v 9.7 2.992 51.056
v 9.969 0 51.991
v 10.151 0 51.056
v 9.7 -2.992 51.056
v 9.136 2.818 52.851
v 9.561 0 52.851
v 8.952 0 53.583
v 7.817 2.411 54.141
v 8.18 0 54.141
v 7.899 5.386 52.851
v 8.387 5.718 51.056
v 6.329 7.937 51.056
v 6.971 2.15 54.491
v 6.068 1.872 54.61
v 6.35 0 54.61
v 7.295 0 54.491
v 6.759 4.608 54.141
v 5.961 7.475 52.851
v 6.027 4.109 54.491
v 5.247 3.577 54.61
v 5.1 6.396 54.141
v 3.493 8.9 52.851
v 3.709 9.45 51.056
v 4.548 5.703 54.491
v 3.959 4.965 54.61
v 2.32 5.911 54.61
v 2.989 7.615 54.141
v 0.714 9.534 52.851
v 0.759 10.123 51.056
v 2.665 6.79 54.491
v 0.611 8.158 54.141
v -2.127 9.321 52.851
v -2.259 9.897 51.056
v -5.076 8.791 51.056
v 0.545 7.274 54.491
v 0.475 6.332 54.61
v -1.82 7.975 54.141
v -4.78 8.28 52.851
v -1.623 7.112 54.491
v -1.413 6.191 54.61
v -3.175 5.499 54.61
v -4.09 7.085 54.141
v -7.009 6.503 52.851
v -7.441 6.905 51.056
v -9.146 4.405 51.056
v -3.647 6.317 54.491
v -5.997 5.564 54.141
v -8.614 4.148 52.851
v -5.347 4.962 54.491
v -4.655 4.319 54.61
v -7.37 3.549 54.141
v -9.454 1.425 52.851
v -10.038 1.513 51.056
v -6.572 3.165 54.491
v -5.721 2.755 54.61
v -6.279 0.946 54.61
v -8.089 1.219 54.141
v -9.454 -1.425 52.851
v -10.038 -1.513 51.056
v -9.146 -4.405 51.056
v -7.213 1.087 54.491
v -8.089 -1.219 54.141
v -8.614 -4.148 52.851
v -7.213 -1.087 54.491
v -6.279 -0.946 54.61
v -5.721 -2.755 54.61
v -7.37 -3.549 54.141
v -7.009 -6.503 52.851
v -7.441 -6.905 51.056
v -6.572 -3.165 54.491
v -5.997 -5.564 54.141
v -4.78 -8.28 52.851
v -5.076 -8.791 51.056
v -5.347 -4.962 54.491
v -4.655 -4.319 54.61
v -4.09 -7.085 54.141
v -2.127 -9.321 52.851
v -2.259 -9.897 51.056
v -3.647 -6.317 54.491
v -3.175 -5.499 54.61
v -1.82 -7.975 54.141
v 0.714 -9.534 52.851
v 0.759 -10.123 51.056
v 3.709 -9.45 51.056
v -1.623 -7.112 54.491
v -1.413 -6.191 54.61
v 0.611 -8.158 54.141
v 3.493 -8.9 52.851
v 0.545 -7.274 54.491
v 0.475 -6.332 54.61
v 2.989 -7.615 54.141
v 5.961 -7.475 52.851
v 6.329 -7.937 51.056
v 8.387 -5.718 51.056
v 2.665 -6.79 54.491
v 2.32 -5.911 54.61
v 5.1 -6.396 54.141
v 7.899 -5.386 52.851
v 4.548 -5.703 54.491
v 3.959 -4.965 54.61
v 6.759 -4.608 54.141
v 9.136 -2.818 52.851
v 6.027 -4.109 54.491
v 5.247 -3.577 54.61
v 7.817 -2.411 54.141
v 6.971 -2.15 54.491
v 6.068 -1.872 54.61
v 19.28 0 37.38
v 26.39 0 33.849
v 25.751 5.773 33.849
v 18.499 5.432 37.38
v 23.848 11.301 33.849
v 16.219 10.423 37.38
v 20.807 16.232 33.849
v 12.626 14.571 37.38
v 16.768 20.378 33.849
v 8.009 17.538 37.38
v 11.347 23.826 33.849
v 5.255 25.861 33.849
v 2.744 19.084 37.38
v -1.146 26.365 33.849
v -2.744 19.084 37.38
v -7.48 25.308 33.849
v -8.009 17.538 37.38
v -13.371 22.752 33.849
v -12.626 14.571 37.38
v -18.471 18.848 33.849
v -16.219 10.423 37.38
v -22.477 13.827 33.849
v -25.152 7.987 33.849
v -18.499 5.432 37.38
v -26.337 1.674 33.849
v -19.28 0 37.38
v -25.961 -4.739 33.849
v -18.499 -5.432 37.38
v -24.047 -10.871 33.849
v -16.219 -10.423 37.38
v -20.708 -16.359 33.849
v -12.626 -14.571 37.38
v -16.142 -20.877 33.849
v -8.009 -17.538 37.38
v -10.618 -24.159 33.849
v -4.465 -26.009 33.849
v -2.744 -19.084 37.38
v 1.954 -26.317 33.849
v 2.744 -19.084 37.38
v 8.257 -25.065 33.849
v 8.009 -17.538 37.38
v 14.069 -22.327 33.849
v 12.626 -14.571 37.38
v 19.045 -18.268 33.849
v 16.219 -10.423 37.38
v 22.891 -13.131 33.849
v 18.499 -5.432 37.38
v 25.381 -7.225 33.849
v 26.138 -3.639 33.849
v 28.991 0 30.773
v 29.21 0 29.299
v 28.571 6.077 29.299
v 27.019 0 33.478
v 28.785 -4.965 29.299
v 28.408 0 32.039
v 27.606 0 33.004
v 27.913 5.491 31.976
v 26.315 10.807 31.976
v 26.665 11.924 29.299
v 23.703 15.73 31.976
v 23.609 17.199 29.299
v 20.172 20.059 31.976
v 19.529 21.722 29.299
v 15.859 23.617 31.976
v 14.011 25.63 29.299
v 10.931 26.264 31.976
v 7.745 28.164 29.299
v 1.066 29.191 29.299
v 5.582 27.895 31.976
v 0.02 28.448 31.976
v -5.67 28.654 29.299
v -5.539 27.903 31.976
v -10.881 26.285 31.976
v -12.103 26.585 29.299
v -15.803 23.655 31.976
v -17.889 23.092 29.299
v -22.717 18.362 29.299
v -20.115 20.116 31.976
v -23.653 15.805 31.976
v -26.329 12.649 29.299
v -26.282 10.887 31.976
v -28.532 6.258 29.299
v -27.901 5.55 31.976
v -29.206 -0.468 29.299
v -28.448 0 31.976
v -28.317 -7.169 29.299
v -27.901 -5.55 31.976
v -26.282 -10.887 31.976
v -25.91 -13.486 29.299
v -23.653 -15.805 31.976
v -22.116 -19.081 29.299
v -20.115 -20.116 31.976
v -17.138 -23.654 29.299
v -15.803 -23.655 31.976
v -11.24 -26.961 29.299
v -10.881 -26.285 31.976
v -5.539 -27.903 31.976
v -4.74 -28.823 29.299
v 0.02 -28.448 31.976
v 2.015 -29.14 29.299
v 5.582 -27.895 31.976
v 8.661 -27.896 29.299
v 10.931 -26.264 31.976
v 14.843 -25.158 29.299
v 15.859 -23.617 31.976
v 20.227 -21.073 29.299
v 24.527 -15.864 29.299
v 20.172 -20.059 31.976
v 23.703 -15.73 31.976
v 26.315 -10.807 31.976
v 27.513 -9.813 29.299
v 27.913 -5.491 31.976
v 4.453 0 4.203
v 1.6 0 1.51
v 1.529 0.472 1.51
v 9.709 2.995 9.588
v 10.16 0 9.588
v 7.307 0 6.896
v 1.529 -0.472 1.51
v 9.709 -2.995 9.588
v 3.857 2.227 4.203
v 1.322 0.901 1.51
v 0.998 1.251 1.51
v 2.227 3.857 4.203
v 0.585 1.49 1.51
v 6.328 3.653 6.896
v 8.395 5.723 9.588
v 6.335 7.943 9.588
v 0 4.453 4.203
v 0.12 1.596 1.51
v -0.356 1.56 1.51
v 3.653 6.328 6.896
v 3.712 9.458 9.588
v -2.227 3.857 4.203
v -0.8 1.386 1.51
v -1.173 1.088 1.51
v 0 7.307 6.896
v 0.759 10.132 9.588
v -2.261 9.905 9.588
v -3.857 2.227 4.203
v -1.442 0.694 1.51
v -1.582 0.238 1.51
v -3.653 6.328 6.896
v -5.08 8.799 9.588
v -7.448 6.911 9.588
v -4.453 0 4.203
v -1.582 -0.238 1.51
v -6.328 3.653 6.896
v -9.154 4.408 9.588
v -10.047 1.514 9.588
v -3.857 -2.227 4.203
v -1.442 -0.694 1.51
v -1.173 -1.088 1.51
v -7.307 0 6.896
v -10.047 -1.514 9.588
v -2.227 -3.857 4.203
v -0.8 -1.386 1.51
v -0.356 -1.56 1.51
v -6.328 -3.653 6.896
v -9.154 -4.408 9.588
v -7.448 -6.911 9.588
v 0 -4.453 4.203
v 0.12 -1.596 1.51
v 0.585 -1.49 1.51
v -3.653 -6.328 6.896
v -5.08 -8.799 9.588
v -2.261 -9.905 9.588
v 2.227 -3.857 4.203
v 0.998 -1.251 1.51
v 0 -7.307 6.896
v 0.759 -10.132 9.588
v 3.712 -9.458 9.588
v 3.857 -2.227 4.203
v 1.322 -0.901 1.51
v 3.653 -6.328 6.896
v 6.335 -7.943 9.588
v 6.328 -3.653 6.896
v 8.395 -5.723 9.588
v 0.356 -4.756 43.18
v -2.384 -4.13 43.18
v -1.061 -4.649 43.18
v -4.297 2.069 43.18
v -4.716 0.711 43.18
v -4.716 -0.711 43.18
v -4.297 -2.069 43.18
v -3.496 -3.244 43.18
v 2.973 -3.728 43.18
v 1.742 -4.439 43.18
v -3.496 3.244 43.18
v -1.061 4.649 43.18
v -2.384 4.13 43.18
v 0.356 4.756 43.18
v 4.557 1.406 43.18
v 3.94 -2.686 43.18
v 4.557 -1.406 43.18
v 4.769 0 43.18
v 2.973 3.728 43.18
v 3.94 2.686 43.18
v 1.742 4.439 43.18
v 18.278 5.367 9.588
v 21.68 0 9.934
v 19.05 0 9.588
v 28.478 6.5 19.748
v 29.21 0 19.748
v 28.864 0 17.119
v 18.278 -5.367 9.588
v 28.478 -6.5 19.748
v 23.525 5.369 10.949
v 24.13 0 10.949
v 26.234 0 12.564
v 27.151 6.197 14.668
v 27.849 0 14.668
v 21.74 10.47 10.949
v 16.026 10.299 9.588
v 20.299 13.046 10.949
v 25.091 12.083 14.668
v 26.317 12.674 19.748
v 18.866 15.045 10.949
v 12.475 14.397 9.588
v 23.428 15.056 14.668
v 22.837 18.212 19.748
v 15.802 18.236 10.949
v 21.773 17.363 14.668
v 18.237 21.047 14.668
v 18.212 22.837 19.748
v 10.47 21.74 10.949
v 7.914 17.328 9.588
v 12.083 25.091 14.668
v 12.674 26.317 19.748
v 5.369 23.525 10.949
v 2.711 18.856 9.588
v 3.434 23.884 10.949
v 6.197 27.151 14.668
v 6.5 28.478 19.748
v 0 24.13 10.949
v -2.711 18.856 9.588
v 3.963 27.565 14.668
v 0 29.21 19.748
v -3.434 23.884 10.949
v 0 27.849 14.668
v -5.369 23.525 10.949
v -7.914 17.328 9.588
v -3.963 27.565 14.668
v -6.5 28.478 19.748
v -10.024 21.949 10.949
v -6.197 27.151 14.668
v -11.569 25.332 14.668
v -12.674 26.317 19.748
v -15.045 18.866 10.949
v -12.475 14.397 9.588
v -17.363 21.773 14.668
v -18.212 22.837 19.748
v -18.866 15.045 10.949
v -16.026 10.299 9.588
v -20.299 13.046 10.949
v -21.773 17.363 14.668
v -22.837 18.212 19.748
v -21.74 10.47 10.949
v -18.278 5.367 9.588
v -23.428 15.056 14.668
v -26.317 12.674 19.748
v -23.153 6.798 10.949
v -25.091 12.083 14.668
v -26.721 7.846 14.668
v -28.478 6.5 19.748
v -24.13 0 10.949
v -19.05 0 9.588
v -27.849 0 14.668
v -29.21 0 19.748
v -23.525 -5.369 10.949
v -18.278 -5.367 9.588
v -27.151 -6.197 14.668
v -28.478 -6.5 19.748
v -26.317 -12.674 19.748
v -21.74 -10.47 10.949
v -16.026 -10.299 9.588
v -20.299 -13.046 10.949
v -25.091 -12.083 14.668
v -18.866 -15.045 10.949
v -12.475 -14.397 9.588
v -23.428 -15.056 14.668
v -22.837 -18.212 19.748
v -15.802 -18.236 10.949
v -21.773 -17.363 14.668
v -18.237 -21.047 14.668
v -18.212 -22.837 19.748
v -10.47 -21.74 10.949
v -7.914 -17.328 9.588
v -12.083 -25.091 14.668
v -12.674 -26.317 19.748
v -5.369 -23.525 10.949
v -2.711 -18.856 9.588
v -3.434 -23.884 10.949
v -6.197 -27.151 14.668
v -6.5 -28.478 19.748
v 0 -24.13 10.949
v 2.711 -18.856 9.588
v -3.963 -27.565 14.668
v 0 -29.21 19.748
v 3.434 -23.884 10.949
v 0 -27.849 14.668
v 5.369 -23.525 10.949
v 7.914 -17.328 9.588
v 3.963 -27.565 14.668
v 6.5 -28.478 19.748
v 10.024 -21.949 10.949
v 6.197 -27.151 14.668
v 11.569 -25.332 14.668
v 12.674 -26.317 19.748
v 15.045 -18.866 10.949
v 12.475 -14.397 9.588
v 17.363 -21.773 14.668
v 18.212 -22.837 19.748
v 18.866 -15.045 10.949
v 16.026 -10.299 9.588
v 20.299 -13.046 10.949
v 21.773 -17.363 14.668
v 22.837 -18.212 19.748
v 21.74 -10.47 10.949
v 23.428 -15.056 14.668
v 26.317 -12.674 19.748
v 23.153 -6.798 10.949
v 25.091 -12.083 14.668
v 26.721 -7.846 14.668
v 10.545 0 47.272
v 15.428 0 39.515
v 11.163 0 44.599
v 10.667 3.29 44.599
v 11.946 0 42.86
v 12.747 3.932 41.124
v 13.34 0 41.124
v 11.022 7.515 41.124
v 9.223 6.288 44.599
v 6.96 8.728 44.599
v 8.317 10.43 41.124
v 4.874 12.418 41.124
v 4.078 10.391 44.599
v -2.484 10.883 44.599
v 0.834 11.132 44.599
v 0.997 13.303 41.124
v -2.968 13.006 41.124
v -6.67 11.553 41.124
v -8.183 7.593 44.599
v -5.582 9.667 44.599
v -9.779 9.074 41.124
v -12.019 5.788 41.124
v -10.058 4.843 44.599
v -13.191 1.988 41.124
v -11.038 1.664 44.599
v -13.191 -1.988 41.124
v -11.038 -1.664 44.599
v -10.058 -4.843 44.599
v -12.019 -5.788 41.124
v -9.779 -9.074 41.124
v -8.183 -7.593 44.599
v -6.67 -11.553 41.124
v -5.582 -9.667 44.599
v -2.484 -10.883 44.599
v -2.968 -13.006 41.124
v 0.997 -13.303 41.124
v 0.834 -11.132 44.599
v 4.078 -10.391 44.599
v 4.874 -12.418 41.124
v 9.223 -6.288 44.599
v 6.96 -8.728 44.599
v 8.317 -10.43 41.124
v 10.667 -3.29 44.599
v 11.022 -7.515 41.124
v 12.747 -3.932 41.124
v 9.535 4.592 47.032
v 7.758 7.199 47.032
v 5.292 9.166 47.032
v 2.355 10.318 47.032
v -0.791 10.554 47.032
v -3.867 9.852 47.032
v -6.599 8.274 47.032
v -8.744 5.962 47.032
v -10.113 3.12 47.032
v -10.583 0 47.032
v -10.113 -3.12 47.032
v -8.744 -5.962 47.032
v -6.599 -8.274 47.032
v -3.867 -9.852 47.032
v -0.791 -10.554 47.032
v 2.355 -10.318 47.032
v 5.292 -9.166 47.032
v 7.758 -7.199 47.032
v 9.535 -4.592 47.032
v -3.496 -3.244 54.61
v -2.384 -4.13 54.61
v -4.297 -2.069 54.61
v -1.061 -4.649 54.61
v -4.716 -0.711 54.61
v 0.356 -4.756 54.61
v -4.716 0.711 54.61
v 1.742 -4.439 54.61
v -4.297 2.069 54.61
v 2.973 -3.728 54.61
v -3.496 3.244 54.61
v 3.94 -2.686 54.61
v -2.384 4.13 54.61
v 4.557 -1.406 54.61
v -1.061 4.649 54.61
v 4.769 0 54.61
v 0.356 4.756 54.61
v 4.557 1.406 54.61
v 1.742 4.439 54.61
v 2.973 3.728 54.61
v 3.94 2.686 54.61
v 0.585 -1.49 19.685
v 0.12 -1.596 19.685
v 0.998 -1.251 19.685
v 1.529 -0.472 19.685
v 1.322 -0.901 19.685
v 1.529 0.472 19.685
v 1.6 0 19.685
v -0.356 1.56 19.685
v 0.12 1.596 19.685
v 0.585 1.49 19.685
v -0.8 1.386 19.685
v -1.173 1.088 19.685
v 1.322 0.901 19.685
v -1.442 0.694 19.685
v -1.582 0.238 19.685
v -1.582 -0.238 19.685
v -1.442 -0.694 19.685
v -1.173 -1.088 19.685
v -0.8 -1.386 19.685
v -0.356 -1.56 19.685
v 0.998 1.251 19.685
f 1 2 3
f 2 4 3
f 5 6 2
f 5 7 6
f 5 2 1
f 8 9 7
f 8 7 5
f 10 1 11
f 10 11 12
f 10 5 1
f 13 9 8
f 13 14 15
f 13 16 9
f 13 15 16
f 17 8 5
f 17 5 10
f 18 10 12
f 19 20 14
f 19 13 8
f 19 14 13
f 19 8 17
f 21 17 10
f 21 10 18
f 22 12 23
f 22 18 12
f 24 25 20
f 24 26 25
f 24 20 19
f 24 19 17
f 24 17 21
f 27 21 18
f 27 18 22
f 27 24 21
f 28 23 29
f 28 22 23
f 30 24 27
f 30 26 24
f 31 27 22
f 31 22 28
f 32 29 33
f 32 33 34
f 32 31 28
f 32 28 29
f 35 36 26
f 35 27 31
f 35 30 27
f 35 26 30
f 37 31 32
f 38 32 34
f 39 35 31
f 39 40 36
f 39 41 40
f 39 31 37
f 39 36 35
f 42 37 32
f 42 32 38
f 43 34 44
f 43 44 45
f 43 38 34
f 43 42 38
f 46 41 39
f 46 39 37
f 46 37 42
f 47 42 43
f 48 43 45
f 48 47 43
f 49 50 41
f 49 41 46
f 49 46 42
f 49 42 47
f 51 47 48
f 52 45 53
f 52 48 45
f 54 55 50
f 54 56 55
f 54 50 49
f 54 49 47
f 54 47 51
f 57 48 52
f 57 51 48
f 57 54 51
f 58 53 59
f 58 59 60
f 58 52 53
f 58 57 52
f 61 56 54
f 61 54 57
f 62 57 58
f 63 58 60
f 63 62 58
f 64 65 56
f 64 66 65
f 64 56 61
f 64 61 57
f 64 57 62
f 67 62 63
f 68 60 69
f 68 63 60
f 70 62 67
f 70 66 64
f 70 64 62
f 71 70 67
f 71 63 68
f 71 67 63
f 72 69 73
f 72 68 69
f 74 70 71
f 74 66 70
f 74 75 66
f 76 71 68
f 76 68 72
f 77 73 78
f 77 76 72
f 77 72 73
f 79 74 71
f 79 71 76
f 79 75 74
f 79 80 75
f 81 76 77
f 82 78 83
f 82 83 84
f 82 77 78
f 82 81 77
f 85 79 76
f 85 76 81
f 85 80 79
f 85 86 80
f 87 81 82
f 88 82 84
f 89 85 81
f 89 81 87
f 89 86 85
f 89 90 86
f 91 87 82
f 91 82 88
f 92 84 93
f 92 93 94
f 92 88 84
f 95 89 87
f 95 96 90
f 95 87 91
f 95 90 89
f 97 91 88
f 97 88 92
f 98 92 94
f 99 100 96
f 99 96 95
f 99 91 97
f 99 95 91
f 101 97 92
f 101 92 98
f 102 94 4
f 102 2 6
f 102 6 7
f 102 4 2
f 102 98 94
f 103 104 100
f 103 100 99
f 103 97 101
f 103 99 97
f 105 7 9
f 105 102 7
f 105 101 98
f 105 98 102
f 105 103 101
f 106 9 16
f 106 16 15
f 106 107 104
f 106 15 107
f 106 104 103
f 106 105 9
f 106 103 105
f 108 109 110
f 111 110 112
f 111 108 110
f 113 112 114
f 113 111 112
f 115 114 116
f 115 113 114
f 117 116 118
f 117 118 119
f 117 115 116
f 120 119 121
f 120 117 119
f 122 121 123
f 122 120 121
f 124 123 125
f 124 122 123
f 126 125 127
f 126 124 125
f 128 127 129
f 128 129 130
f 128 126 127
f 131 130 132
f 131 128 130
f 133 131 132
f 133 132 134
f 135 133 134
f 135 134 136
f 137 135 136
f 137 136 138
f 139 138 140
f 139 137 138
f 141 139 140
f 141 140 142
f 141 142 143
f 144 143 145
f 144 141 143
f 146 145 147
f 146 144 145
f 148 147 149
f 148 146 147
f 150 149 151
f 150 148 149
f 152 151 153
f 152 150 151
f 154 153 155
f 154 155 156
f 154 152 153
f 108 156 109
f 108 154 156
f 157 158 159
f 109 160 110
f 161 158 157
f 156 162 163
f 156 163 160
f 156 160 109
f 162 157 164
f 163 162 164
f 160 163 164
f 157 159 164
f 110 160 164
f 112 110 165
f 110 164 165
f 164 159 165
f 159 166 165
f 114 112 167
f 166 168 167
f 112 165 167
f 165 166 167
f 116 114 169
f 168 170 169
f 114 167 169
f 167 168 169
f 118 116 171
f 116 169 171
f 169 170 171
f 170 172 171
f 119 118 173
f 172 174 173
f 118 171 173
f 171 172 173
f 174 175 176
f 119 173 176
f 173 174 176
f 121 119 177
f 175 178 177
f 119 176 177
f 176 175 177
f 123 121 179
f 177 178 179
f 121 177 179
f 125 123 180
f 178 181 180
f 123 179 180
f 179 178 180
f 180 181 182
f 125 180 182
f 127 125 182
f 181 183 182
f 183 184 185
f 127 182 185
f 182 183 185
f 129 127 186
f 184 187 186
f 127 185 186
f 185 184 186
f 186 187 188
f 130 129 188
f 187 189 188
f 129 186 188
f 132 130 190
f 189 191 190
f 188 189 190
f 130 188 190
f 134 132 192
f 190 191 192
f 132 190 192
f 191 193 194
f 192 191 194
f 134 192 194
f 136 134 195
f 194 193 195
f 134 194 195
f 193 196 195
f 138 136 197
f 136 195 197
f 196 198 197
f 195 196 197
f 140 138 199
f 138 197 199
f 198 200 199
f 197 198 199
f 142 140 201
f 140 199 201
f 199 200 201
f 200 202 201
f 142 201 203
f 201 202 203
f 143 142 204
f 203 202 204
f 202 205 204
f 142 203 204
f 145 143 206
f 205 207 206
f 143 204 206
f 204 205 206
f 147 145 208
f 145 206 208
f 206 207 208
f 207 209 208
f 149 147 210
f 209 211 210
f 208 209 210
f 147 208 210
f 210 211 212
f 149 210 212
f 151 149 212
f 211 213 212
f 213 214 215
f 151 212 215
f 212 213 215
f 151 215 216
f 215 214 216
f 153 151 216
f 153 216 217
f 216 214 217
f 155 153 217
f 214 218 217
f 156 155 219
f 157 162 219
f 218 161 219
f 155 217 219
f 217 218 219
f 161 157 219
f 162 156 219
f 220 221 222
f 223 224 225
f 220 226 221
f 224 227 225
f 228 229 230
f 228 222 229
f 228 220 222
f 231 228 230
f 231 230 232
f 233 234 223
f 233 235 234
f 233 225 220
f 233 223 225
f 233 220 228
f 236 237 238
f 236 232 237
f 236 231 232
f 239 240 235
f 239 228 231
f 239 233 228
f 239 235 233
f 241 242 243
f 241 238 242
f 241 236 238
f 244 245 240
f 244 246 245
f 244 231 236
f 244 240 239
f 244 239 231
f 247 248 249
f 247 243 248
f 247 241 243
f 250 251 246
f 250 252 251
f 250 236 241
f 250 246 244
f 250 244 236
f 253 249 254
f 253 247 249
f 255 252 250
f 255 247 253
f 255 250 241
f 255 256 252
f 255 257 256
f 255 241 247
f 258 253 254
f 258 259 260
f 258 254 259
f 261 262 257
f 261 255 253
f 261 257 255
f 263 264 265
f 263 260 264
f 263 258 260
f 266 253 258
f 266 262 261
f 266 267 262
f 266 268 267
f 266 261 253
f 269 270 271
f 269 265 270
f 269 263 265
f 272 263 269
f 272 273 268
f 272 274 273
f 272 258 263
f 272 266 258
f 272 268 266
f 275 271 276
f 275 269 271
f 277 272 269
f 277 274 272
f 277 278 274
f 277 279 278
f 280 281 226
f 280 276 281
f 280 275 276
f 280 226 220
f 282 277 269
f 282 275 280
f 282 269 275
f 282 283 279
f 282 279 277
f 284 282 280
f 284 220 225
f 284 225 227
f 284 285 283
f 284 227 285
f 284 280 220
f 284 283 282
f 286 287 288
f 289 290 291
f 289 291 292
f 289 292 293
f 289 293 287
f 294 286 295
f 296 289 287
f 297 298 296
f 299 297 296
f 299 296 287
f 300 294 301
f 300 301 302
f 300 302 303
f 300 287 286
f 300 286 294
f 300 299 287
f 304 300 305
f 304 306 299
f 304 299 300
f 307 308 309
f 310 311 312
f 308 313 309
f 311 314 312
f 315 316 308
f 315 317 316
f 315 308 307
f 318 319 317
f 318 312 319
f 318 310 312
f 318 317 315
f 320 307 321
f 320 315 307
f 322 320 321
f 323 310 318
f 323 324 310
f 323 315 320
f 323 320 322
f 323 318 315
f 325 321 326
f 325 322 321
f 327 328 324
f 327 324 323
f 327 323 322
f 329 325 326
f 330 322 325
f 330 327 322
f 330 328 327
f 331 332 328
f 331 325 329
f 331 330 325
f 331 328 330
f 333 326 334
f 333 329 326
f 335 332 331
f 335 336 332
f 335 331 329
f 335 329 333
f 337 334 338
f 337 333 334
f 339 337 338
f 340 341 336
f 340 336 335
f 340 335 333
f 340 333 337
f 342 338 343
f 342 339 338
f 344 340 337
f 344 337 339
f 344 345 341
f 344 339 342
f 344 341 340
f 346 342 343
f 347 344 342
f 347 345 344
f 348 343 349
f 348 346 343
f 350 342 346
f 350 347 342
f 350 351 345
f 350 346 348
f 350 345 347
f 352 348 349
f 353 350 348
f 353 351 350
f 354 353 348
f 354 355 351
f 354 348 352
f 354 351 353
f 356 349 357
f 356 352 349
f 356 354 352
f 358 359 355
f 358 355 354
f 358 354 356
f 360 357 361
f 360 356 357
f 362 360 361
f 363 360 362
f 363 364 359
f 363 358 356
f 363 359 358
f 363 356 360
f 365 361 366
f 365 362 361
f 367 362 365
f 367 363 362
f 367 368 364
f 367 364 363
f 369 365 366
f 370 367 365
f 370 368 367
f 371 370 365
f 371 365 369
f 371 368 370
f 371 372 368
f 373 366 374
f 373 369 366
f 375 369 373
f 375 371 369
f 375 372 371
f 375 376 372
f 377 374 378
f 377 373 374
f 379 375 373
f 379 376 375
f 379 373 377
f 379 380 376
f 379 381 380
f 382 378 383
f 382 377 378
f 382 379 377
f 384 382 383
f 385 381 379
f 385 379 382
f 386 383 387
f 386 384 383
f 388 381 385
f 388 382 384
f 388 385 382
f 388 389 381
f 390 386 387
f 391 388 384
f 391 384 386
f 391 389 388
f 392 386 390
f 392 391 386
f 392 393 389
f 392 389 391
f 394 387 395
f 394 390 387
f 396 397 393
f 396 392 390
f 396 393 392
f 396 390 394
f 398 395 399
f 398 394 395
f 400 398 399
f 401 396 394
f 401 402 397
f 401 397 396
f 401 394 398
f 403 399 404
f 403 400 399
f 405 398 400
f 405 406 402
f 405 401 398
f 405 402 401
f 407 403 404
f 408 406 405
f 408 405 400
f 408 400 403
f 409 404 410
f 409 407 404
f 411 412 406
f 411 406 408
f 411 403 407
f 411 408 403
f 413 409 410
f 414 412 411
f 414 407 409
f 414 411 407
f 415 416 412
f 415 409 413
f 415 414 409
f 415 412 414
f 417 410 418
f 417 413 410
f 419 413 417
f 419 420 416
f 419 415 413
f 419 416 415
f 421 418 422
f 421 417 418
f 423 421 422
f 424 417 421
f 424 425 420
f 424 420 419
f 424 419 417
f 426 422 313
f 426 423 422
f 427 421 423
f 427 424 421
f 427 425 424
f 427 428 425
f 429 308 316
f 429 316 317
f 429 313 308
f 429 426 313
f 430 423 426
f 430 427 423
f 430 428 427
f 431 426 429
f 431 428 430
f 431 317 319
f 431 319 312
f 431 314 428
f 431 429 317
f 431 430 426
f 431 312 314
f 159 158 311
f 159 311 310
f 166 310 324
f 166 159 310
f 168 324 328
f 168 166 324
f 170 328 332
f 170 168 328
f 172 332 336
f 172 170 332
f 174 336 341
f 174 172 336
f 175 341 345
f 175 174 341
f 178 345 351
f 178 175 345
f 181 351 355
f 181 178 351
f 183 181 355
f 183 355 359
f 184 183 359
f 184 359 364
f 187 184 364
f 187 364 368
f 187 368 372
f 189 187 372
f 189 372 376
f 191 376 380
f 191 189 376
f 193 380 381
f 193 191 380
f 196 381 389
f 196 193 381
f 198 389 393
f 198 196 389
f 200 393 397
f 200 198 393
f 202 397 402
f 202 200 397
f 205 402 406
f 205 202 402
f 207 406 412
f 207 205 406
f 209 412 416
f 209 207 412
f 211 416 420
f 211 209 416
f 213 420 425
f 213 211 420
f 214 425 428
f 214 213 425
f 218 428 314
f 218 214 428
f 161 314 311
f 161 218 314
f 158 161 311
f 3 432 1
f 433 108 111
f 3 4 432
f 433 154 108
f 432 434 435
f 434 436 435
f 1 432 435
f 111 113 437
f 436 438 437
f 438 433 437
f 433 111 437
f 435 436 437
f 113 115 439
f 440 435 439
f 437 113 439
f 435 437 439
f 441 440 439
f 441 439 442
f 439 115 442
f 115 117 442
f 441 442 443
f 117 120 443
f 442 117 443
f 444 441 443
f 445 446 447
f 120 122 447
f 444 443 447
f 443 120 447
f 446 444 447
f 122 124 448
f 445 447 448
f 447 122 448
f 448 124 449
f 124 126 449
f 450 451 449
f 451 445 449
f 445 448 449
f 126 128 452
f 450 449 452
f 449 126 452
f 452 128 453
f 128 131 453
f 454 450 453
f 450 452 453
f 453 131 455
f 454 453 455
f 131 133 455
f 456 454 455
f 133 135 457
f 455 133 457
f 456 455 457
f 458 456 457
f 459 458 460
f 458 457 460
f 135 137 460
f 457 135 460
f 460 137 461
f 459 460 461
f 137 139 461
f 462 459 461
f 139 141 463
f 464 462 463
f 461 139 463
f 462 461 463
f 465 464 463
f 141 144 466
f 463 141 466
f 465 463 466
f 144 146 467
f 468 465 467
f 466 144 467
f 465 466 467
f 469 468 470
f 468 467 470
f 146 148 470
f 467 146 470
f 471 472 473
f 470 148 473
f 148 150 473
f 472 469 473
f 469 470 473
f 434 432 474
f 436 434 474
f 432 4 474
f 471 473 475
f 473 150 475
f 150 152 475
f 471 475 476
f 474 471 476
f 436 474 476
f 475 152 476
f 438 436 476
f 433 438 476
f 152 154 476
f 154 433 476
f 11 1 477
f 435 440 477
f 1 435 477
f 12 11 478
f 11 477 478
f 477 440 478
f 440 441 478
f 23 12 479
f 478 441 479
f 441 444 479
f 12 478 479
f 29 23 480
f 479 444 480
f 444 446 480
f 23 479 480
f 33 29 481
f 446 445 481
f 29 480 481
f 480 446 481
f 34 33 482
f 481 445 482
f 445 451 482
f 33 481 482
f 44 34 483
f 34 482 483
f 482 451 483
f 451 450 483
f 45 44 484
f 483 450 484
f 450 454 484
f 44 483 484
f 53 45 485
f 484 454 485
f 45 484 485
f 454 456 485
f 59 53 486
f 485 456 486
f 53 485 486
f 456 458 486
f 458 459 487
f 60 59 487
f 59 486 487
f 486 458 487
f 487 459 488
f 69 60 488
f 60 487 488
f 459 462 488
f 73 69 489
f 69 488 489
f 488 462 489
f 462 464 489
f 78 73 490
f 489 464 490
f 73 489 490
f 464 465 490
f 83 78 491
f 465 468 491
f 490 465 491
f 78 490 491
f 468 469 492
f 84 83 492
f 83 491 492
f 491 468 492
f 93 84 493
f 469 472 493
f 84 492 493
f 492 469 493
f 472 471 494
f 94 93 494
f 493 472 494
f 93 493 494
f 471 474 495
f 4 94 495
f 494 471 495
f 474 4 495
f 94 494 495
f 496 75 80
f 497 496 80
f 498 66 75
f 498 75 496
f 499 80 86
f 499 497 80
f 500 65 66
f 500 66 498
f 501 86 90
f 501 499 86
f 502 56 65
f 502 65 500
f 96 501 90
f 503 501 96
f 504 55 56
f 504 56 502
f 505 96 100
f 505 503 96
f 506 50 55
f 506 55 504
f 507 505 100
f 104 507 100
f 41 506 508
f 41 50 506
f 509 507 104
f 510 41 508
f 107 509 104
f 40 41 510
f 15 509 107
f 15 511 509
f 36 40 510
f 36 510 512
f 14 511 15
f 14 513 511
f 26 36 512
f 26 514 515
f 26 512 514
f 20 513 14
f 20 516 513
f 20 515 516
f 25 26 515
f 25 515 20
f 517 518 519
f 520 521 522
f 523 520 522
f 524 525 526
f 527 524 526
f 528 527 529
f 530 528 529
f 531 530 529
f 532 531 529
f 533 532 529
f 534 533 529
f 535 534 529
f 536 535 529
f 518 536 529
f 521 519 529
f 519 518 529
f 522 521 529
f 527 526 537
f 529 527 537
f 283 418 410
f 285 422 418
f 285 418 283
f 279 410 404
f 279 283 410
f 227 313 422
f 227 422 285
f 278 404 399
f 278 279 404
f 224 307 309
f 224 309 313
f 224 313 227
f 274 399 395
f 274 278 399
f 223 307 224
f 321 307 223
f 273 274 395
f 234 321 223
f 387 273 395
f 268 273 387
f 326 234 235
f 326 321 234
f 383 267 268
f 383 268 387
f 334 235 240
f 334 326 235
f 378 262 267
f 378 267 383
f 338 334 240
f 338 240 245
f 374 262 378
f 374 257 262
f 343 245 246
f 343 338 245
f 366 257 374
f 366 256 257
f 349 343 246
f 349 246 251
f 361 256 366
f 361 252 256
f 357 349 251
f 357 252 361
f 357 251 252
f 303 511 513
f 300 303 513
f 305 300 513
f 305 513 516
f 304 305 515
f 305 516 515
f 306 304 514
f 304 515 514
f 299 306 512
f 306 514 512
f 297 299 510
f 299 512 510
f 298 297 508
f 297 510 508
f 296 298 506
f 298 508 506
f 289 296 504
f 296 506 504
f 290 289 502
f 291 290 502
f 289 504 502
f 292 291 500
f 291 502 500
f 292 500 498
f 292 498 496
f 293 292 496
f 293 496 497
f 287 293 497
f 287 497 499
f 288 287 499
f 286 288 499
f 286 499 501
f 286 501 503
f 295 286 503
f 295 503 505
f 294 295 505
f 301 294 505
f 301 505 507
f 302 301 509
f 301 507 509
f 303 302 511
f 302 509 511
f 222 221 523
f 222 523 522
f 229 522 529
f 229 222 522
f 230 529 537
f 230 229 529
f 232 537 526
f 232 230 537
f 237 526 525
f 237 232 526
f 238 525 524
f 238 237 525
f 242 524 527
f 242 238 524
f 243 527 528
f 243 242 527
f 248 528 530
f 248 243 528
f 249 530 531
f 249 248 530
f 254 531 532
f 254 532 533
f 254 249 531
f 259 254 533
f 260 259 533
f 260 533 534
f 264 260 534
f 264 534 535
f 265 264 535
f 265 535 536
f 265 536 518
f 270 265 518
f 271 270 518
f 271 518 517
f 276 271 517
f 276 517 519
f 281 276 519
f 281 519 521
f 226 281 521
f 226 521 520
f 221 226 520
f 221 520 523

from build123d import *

# Parameters (mm, degrees)
F2_R     = 10.16
F3_R     = 5.08
F4_R     = 4.76885
F5_DEPTH = 11.43
F6_R     = 1.6002
F7_DEPTH = 19.685
F8_R     = 3.81


# Not quite as in the source:
# - a fillet or chamfer that OpenCascade refuses, or shapes differently, is made with other operations: its cross-section is extruded or revolved along the edge and cut away or added


with BuildPart() as f1:
    # F0 (on Front) → F1 (revolve)
    with BuildSketch(Plane.XZ):
        Polygon((0, 54.61), (0, 0), (10.16, 9.5882897328), (29.21, 9.5882897328), (29.21, 32.4482897328), (10.16, 41.9100038707), (10.16, 54.61), align=None)
    revolve(axis=Axis((0, 0, 27.305), (0, 0, 1)))

    # F2
    f2_edges = [f1.edges().sort_by_distance(p)[0] for p in [
        (-29.21, 0, 9.58829),
    ]]
    fillet(f2_edges, radius=F2_R)

    # F3
    f3_edges = [f1.edges().sort_by_distance(p)[0] for p in [
        (-29.21, 0, 32.44829),
    ]]
    fillet(f3_edges, radius=F3_R)

    # F4 (on face) → F5 (cut)
    with BuildSketch(Plane.XY.offset(54.61)):
        Circle(F4_R)
    extrude(amount=-F5_DEPTH, mode=Mode.SUBTRACT)

    # F6 (on Top) → F7 (cut)
    with BuildSketch(Plane.XY):
        Circle(F6_R)
    extrude(amount=F7_DEPTH, mode=Mode.SUBTRACT)

    # F8
    f8_edges = [f1.edges().sort_by_distance(p)[0] for p in [
        (-10.16, 0, 54.61),
    ]]
    fillet(f8_edges, radius=F8_R)

    # F9: fillet of radius 16.51 on 3 edges, made by hand

    # F9_s1 → F9_t2 (revolve)
    with BuildSketch(Plane.XZ):
        with BuildLine():
            add(Edge.make_bspline(
                [(10.1513687758, 51.056311199), (10.7891371387, 41.5975253532), (19.279794422, 37.3804034604)],
                knots=[0, 0, 0, 1, 1, 1], degree=2, weights=[1, 1.8571428571, 1]))
            Line((19.279794422, 37.3804034604), (18.5453771838, 35.9017445003))
            Line((18.5453771838, 35.9017445003), (9.4255827618, 40.4313449106))
            Line((9.4255827618, 40.4313449106), (8.509, 41.9100038707))
            ThreePointArc((8.509, 41.9100038707), (8.509, 50.8), (8.5041089729, 50.9452430127))
            Line((8.5041089729, 50.9452430127), (10.1513687758, 51.056311199))
        make_face()
    revolve(axis=Axis((0, 0, 41.9100038707), (0, 0, 1)))


solid = f1.part
